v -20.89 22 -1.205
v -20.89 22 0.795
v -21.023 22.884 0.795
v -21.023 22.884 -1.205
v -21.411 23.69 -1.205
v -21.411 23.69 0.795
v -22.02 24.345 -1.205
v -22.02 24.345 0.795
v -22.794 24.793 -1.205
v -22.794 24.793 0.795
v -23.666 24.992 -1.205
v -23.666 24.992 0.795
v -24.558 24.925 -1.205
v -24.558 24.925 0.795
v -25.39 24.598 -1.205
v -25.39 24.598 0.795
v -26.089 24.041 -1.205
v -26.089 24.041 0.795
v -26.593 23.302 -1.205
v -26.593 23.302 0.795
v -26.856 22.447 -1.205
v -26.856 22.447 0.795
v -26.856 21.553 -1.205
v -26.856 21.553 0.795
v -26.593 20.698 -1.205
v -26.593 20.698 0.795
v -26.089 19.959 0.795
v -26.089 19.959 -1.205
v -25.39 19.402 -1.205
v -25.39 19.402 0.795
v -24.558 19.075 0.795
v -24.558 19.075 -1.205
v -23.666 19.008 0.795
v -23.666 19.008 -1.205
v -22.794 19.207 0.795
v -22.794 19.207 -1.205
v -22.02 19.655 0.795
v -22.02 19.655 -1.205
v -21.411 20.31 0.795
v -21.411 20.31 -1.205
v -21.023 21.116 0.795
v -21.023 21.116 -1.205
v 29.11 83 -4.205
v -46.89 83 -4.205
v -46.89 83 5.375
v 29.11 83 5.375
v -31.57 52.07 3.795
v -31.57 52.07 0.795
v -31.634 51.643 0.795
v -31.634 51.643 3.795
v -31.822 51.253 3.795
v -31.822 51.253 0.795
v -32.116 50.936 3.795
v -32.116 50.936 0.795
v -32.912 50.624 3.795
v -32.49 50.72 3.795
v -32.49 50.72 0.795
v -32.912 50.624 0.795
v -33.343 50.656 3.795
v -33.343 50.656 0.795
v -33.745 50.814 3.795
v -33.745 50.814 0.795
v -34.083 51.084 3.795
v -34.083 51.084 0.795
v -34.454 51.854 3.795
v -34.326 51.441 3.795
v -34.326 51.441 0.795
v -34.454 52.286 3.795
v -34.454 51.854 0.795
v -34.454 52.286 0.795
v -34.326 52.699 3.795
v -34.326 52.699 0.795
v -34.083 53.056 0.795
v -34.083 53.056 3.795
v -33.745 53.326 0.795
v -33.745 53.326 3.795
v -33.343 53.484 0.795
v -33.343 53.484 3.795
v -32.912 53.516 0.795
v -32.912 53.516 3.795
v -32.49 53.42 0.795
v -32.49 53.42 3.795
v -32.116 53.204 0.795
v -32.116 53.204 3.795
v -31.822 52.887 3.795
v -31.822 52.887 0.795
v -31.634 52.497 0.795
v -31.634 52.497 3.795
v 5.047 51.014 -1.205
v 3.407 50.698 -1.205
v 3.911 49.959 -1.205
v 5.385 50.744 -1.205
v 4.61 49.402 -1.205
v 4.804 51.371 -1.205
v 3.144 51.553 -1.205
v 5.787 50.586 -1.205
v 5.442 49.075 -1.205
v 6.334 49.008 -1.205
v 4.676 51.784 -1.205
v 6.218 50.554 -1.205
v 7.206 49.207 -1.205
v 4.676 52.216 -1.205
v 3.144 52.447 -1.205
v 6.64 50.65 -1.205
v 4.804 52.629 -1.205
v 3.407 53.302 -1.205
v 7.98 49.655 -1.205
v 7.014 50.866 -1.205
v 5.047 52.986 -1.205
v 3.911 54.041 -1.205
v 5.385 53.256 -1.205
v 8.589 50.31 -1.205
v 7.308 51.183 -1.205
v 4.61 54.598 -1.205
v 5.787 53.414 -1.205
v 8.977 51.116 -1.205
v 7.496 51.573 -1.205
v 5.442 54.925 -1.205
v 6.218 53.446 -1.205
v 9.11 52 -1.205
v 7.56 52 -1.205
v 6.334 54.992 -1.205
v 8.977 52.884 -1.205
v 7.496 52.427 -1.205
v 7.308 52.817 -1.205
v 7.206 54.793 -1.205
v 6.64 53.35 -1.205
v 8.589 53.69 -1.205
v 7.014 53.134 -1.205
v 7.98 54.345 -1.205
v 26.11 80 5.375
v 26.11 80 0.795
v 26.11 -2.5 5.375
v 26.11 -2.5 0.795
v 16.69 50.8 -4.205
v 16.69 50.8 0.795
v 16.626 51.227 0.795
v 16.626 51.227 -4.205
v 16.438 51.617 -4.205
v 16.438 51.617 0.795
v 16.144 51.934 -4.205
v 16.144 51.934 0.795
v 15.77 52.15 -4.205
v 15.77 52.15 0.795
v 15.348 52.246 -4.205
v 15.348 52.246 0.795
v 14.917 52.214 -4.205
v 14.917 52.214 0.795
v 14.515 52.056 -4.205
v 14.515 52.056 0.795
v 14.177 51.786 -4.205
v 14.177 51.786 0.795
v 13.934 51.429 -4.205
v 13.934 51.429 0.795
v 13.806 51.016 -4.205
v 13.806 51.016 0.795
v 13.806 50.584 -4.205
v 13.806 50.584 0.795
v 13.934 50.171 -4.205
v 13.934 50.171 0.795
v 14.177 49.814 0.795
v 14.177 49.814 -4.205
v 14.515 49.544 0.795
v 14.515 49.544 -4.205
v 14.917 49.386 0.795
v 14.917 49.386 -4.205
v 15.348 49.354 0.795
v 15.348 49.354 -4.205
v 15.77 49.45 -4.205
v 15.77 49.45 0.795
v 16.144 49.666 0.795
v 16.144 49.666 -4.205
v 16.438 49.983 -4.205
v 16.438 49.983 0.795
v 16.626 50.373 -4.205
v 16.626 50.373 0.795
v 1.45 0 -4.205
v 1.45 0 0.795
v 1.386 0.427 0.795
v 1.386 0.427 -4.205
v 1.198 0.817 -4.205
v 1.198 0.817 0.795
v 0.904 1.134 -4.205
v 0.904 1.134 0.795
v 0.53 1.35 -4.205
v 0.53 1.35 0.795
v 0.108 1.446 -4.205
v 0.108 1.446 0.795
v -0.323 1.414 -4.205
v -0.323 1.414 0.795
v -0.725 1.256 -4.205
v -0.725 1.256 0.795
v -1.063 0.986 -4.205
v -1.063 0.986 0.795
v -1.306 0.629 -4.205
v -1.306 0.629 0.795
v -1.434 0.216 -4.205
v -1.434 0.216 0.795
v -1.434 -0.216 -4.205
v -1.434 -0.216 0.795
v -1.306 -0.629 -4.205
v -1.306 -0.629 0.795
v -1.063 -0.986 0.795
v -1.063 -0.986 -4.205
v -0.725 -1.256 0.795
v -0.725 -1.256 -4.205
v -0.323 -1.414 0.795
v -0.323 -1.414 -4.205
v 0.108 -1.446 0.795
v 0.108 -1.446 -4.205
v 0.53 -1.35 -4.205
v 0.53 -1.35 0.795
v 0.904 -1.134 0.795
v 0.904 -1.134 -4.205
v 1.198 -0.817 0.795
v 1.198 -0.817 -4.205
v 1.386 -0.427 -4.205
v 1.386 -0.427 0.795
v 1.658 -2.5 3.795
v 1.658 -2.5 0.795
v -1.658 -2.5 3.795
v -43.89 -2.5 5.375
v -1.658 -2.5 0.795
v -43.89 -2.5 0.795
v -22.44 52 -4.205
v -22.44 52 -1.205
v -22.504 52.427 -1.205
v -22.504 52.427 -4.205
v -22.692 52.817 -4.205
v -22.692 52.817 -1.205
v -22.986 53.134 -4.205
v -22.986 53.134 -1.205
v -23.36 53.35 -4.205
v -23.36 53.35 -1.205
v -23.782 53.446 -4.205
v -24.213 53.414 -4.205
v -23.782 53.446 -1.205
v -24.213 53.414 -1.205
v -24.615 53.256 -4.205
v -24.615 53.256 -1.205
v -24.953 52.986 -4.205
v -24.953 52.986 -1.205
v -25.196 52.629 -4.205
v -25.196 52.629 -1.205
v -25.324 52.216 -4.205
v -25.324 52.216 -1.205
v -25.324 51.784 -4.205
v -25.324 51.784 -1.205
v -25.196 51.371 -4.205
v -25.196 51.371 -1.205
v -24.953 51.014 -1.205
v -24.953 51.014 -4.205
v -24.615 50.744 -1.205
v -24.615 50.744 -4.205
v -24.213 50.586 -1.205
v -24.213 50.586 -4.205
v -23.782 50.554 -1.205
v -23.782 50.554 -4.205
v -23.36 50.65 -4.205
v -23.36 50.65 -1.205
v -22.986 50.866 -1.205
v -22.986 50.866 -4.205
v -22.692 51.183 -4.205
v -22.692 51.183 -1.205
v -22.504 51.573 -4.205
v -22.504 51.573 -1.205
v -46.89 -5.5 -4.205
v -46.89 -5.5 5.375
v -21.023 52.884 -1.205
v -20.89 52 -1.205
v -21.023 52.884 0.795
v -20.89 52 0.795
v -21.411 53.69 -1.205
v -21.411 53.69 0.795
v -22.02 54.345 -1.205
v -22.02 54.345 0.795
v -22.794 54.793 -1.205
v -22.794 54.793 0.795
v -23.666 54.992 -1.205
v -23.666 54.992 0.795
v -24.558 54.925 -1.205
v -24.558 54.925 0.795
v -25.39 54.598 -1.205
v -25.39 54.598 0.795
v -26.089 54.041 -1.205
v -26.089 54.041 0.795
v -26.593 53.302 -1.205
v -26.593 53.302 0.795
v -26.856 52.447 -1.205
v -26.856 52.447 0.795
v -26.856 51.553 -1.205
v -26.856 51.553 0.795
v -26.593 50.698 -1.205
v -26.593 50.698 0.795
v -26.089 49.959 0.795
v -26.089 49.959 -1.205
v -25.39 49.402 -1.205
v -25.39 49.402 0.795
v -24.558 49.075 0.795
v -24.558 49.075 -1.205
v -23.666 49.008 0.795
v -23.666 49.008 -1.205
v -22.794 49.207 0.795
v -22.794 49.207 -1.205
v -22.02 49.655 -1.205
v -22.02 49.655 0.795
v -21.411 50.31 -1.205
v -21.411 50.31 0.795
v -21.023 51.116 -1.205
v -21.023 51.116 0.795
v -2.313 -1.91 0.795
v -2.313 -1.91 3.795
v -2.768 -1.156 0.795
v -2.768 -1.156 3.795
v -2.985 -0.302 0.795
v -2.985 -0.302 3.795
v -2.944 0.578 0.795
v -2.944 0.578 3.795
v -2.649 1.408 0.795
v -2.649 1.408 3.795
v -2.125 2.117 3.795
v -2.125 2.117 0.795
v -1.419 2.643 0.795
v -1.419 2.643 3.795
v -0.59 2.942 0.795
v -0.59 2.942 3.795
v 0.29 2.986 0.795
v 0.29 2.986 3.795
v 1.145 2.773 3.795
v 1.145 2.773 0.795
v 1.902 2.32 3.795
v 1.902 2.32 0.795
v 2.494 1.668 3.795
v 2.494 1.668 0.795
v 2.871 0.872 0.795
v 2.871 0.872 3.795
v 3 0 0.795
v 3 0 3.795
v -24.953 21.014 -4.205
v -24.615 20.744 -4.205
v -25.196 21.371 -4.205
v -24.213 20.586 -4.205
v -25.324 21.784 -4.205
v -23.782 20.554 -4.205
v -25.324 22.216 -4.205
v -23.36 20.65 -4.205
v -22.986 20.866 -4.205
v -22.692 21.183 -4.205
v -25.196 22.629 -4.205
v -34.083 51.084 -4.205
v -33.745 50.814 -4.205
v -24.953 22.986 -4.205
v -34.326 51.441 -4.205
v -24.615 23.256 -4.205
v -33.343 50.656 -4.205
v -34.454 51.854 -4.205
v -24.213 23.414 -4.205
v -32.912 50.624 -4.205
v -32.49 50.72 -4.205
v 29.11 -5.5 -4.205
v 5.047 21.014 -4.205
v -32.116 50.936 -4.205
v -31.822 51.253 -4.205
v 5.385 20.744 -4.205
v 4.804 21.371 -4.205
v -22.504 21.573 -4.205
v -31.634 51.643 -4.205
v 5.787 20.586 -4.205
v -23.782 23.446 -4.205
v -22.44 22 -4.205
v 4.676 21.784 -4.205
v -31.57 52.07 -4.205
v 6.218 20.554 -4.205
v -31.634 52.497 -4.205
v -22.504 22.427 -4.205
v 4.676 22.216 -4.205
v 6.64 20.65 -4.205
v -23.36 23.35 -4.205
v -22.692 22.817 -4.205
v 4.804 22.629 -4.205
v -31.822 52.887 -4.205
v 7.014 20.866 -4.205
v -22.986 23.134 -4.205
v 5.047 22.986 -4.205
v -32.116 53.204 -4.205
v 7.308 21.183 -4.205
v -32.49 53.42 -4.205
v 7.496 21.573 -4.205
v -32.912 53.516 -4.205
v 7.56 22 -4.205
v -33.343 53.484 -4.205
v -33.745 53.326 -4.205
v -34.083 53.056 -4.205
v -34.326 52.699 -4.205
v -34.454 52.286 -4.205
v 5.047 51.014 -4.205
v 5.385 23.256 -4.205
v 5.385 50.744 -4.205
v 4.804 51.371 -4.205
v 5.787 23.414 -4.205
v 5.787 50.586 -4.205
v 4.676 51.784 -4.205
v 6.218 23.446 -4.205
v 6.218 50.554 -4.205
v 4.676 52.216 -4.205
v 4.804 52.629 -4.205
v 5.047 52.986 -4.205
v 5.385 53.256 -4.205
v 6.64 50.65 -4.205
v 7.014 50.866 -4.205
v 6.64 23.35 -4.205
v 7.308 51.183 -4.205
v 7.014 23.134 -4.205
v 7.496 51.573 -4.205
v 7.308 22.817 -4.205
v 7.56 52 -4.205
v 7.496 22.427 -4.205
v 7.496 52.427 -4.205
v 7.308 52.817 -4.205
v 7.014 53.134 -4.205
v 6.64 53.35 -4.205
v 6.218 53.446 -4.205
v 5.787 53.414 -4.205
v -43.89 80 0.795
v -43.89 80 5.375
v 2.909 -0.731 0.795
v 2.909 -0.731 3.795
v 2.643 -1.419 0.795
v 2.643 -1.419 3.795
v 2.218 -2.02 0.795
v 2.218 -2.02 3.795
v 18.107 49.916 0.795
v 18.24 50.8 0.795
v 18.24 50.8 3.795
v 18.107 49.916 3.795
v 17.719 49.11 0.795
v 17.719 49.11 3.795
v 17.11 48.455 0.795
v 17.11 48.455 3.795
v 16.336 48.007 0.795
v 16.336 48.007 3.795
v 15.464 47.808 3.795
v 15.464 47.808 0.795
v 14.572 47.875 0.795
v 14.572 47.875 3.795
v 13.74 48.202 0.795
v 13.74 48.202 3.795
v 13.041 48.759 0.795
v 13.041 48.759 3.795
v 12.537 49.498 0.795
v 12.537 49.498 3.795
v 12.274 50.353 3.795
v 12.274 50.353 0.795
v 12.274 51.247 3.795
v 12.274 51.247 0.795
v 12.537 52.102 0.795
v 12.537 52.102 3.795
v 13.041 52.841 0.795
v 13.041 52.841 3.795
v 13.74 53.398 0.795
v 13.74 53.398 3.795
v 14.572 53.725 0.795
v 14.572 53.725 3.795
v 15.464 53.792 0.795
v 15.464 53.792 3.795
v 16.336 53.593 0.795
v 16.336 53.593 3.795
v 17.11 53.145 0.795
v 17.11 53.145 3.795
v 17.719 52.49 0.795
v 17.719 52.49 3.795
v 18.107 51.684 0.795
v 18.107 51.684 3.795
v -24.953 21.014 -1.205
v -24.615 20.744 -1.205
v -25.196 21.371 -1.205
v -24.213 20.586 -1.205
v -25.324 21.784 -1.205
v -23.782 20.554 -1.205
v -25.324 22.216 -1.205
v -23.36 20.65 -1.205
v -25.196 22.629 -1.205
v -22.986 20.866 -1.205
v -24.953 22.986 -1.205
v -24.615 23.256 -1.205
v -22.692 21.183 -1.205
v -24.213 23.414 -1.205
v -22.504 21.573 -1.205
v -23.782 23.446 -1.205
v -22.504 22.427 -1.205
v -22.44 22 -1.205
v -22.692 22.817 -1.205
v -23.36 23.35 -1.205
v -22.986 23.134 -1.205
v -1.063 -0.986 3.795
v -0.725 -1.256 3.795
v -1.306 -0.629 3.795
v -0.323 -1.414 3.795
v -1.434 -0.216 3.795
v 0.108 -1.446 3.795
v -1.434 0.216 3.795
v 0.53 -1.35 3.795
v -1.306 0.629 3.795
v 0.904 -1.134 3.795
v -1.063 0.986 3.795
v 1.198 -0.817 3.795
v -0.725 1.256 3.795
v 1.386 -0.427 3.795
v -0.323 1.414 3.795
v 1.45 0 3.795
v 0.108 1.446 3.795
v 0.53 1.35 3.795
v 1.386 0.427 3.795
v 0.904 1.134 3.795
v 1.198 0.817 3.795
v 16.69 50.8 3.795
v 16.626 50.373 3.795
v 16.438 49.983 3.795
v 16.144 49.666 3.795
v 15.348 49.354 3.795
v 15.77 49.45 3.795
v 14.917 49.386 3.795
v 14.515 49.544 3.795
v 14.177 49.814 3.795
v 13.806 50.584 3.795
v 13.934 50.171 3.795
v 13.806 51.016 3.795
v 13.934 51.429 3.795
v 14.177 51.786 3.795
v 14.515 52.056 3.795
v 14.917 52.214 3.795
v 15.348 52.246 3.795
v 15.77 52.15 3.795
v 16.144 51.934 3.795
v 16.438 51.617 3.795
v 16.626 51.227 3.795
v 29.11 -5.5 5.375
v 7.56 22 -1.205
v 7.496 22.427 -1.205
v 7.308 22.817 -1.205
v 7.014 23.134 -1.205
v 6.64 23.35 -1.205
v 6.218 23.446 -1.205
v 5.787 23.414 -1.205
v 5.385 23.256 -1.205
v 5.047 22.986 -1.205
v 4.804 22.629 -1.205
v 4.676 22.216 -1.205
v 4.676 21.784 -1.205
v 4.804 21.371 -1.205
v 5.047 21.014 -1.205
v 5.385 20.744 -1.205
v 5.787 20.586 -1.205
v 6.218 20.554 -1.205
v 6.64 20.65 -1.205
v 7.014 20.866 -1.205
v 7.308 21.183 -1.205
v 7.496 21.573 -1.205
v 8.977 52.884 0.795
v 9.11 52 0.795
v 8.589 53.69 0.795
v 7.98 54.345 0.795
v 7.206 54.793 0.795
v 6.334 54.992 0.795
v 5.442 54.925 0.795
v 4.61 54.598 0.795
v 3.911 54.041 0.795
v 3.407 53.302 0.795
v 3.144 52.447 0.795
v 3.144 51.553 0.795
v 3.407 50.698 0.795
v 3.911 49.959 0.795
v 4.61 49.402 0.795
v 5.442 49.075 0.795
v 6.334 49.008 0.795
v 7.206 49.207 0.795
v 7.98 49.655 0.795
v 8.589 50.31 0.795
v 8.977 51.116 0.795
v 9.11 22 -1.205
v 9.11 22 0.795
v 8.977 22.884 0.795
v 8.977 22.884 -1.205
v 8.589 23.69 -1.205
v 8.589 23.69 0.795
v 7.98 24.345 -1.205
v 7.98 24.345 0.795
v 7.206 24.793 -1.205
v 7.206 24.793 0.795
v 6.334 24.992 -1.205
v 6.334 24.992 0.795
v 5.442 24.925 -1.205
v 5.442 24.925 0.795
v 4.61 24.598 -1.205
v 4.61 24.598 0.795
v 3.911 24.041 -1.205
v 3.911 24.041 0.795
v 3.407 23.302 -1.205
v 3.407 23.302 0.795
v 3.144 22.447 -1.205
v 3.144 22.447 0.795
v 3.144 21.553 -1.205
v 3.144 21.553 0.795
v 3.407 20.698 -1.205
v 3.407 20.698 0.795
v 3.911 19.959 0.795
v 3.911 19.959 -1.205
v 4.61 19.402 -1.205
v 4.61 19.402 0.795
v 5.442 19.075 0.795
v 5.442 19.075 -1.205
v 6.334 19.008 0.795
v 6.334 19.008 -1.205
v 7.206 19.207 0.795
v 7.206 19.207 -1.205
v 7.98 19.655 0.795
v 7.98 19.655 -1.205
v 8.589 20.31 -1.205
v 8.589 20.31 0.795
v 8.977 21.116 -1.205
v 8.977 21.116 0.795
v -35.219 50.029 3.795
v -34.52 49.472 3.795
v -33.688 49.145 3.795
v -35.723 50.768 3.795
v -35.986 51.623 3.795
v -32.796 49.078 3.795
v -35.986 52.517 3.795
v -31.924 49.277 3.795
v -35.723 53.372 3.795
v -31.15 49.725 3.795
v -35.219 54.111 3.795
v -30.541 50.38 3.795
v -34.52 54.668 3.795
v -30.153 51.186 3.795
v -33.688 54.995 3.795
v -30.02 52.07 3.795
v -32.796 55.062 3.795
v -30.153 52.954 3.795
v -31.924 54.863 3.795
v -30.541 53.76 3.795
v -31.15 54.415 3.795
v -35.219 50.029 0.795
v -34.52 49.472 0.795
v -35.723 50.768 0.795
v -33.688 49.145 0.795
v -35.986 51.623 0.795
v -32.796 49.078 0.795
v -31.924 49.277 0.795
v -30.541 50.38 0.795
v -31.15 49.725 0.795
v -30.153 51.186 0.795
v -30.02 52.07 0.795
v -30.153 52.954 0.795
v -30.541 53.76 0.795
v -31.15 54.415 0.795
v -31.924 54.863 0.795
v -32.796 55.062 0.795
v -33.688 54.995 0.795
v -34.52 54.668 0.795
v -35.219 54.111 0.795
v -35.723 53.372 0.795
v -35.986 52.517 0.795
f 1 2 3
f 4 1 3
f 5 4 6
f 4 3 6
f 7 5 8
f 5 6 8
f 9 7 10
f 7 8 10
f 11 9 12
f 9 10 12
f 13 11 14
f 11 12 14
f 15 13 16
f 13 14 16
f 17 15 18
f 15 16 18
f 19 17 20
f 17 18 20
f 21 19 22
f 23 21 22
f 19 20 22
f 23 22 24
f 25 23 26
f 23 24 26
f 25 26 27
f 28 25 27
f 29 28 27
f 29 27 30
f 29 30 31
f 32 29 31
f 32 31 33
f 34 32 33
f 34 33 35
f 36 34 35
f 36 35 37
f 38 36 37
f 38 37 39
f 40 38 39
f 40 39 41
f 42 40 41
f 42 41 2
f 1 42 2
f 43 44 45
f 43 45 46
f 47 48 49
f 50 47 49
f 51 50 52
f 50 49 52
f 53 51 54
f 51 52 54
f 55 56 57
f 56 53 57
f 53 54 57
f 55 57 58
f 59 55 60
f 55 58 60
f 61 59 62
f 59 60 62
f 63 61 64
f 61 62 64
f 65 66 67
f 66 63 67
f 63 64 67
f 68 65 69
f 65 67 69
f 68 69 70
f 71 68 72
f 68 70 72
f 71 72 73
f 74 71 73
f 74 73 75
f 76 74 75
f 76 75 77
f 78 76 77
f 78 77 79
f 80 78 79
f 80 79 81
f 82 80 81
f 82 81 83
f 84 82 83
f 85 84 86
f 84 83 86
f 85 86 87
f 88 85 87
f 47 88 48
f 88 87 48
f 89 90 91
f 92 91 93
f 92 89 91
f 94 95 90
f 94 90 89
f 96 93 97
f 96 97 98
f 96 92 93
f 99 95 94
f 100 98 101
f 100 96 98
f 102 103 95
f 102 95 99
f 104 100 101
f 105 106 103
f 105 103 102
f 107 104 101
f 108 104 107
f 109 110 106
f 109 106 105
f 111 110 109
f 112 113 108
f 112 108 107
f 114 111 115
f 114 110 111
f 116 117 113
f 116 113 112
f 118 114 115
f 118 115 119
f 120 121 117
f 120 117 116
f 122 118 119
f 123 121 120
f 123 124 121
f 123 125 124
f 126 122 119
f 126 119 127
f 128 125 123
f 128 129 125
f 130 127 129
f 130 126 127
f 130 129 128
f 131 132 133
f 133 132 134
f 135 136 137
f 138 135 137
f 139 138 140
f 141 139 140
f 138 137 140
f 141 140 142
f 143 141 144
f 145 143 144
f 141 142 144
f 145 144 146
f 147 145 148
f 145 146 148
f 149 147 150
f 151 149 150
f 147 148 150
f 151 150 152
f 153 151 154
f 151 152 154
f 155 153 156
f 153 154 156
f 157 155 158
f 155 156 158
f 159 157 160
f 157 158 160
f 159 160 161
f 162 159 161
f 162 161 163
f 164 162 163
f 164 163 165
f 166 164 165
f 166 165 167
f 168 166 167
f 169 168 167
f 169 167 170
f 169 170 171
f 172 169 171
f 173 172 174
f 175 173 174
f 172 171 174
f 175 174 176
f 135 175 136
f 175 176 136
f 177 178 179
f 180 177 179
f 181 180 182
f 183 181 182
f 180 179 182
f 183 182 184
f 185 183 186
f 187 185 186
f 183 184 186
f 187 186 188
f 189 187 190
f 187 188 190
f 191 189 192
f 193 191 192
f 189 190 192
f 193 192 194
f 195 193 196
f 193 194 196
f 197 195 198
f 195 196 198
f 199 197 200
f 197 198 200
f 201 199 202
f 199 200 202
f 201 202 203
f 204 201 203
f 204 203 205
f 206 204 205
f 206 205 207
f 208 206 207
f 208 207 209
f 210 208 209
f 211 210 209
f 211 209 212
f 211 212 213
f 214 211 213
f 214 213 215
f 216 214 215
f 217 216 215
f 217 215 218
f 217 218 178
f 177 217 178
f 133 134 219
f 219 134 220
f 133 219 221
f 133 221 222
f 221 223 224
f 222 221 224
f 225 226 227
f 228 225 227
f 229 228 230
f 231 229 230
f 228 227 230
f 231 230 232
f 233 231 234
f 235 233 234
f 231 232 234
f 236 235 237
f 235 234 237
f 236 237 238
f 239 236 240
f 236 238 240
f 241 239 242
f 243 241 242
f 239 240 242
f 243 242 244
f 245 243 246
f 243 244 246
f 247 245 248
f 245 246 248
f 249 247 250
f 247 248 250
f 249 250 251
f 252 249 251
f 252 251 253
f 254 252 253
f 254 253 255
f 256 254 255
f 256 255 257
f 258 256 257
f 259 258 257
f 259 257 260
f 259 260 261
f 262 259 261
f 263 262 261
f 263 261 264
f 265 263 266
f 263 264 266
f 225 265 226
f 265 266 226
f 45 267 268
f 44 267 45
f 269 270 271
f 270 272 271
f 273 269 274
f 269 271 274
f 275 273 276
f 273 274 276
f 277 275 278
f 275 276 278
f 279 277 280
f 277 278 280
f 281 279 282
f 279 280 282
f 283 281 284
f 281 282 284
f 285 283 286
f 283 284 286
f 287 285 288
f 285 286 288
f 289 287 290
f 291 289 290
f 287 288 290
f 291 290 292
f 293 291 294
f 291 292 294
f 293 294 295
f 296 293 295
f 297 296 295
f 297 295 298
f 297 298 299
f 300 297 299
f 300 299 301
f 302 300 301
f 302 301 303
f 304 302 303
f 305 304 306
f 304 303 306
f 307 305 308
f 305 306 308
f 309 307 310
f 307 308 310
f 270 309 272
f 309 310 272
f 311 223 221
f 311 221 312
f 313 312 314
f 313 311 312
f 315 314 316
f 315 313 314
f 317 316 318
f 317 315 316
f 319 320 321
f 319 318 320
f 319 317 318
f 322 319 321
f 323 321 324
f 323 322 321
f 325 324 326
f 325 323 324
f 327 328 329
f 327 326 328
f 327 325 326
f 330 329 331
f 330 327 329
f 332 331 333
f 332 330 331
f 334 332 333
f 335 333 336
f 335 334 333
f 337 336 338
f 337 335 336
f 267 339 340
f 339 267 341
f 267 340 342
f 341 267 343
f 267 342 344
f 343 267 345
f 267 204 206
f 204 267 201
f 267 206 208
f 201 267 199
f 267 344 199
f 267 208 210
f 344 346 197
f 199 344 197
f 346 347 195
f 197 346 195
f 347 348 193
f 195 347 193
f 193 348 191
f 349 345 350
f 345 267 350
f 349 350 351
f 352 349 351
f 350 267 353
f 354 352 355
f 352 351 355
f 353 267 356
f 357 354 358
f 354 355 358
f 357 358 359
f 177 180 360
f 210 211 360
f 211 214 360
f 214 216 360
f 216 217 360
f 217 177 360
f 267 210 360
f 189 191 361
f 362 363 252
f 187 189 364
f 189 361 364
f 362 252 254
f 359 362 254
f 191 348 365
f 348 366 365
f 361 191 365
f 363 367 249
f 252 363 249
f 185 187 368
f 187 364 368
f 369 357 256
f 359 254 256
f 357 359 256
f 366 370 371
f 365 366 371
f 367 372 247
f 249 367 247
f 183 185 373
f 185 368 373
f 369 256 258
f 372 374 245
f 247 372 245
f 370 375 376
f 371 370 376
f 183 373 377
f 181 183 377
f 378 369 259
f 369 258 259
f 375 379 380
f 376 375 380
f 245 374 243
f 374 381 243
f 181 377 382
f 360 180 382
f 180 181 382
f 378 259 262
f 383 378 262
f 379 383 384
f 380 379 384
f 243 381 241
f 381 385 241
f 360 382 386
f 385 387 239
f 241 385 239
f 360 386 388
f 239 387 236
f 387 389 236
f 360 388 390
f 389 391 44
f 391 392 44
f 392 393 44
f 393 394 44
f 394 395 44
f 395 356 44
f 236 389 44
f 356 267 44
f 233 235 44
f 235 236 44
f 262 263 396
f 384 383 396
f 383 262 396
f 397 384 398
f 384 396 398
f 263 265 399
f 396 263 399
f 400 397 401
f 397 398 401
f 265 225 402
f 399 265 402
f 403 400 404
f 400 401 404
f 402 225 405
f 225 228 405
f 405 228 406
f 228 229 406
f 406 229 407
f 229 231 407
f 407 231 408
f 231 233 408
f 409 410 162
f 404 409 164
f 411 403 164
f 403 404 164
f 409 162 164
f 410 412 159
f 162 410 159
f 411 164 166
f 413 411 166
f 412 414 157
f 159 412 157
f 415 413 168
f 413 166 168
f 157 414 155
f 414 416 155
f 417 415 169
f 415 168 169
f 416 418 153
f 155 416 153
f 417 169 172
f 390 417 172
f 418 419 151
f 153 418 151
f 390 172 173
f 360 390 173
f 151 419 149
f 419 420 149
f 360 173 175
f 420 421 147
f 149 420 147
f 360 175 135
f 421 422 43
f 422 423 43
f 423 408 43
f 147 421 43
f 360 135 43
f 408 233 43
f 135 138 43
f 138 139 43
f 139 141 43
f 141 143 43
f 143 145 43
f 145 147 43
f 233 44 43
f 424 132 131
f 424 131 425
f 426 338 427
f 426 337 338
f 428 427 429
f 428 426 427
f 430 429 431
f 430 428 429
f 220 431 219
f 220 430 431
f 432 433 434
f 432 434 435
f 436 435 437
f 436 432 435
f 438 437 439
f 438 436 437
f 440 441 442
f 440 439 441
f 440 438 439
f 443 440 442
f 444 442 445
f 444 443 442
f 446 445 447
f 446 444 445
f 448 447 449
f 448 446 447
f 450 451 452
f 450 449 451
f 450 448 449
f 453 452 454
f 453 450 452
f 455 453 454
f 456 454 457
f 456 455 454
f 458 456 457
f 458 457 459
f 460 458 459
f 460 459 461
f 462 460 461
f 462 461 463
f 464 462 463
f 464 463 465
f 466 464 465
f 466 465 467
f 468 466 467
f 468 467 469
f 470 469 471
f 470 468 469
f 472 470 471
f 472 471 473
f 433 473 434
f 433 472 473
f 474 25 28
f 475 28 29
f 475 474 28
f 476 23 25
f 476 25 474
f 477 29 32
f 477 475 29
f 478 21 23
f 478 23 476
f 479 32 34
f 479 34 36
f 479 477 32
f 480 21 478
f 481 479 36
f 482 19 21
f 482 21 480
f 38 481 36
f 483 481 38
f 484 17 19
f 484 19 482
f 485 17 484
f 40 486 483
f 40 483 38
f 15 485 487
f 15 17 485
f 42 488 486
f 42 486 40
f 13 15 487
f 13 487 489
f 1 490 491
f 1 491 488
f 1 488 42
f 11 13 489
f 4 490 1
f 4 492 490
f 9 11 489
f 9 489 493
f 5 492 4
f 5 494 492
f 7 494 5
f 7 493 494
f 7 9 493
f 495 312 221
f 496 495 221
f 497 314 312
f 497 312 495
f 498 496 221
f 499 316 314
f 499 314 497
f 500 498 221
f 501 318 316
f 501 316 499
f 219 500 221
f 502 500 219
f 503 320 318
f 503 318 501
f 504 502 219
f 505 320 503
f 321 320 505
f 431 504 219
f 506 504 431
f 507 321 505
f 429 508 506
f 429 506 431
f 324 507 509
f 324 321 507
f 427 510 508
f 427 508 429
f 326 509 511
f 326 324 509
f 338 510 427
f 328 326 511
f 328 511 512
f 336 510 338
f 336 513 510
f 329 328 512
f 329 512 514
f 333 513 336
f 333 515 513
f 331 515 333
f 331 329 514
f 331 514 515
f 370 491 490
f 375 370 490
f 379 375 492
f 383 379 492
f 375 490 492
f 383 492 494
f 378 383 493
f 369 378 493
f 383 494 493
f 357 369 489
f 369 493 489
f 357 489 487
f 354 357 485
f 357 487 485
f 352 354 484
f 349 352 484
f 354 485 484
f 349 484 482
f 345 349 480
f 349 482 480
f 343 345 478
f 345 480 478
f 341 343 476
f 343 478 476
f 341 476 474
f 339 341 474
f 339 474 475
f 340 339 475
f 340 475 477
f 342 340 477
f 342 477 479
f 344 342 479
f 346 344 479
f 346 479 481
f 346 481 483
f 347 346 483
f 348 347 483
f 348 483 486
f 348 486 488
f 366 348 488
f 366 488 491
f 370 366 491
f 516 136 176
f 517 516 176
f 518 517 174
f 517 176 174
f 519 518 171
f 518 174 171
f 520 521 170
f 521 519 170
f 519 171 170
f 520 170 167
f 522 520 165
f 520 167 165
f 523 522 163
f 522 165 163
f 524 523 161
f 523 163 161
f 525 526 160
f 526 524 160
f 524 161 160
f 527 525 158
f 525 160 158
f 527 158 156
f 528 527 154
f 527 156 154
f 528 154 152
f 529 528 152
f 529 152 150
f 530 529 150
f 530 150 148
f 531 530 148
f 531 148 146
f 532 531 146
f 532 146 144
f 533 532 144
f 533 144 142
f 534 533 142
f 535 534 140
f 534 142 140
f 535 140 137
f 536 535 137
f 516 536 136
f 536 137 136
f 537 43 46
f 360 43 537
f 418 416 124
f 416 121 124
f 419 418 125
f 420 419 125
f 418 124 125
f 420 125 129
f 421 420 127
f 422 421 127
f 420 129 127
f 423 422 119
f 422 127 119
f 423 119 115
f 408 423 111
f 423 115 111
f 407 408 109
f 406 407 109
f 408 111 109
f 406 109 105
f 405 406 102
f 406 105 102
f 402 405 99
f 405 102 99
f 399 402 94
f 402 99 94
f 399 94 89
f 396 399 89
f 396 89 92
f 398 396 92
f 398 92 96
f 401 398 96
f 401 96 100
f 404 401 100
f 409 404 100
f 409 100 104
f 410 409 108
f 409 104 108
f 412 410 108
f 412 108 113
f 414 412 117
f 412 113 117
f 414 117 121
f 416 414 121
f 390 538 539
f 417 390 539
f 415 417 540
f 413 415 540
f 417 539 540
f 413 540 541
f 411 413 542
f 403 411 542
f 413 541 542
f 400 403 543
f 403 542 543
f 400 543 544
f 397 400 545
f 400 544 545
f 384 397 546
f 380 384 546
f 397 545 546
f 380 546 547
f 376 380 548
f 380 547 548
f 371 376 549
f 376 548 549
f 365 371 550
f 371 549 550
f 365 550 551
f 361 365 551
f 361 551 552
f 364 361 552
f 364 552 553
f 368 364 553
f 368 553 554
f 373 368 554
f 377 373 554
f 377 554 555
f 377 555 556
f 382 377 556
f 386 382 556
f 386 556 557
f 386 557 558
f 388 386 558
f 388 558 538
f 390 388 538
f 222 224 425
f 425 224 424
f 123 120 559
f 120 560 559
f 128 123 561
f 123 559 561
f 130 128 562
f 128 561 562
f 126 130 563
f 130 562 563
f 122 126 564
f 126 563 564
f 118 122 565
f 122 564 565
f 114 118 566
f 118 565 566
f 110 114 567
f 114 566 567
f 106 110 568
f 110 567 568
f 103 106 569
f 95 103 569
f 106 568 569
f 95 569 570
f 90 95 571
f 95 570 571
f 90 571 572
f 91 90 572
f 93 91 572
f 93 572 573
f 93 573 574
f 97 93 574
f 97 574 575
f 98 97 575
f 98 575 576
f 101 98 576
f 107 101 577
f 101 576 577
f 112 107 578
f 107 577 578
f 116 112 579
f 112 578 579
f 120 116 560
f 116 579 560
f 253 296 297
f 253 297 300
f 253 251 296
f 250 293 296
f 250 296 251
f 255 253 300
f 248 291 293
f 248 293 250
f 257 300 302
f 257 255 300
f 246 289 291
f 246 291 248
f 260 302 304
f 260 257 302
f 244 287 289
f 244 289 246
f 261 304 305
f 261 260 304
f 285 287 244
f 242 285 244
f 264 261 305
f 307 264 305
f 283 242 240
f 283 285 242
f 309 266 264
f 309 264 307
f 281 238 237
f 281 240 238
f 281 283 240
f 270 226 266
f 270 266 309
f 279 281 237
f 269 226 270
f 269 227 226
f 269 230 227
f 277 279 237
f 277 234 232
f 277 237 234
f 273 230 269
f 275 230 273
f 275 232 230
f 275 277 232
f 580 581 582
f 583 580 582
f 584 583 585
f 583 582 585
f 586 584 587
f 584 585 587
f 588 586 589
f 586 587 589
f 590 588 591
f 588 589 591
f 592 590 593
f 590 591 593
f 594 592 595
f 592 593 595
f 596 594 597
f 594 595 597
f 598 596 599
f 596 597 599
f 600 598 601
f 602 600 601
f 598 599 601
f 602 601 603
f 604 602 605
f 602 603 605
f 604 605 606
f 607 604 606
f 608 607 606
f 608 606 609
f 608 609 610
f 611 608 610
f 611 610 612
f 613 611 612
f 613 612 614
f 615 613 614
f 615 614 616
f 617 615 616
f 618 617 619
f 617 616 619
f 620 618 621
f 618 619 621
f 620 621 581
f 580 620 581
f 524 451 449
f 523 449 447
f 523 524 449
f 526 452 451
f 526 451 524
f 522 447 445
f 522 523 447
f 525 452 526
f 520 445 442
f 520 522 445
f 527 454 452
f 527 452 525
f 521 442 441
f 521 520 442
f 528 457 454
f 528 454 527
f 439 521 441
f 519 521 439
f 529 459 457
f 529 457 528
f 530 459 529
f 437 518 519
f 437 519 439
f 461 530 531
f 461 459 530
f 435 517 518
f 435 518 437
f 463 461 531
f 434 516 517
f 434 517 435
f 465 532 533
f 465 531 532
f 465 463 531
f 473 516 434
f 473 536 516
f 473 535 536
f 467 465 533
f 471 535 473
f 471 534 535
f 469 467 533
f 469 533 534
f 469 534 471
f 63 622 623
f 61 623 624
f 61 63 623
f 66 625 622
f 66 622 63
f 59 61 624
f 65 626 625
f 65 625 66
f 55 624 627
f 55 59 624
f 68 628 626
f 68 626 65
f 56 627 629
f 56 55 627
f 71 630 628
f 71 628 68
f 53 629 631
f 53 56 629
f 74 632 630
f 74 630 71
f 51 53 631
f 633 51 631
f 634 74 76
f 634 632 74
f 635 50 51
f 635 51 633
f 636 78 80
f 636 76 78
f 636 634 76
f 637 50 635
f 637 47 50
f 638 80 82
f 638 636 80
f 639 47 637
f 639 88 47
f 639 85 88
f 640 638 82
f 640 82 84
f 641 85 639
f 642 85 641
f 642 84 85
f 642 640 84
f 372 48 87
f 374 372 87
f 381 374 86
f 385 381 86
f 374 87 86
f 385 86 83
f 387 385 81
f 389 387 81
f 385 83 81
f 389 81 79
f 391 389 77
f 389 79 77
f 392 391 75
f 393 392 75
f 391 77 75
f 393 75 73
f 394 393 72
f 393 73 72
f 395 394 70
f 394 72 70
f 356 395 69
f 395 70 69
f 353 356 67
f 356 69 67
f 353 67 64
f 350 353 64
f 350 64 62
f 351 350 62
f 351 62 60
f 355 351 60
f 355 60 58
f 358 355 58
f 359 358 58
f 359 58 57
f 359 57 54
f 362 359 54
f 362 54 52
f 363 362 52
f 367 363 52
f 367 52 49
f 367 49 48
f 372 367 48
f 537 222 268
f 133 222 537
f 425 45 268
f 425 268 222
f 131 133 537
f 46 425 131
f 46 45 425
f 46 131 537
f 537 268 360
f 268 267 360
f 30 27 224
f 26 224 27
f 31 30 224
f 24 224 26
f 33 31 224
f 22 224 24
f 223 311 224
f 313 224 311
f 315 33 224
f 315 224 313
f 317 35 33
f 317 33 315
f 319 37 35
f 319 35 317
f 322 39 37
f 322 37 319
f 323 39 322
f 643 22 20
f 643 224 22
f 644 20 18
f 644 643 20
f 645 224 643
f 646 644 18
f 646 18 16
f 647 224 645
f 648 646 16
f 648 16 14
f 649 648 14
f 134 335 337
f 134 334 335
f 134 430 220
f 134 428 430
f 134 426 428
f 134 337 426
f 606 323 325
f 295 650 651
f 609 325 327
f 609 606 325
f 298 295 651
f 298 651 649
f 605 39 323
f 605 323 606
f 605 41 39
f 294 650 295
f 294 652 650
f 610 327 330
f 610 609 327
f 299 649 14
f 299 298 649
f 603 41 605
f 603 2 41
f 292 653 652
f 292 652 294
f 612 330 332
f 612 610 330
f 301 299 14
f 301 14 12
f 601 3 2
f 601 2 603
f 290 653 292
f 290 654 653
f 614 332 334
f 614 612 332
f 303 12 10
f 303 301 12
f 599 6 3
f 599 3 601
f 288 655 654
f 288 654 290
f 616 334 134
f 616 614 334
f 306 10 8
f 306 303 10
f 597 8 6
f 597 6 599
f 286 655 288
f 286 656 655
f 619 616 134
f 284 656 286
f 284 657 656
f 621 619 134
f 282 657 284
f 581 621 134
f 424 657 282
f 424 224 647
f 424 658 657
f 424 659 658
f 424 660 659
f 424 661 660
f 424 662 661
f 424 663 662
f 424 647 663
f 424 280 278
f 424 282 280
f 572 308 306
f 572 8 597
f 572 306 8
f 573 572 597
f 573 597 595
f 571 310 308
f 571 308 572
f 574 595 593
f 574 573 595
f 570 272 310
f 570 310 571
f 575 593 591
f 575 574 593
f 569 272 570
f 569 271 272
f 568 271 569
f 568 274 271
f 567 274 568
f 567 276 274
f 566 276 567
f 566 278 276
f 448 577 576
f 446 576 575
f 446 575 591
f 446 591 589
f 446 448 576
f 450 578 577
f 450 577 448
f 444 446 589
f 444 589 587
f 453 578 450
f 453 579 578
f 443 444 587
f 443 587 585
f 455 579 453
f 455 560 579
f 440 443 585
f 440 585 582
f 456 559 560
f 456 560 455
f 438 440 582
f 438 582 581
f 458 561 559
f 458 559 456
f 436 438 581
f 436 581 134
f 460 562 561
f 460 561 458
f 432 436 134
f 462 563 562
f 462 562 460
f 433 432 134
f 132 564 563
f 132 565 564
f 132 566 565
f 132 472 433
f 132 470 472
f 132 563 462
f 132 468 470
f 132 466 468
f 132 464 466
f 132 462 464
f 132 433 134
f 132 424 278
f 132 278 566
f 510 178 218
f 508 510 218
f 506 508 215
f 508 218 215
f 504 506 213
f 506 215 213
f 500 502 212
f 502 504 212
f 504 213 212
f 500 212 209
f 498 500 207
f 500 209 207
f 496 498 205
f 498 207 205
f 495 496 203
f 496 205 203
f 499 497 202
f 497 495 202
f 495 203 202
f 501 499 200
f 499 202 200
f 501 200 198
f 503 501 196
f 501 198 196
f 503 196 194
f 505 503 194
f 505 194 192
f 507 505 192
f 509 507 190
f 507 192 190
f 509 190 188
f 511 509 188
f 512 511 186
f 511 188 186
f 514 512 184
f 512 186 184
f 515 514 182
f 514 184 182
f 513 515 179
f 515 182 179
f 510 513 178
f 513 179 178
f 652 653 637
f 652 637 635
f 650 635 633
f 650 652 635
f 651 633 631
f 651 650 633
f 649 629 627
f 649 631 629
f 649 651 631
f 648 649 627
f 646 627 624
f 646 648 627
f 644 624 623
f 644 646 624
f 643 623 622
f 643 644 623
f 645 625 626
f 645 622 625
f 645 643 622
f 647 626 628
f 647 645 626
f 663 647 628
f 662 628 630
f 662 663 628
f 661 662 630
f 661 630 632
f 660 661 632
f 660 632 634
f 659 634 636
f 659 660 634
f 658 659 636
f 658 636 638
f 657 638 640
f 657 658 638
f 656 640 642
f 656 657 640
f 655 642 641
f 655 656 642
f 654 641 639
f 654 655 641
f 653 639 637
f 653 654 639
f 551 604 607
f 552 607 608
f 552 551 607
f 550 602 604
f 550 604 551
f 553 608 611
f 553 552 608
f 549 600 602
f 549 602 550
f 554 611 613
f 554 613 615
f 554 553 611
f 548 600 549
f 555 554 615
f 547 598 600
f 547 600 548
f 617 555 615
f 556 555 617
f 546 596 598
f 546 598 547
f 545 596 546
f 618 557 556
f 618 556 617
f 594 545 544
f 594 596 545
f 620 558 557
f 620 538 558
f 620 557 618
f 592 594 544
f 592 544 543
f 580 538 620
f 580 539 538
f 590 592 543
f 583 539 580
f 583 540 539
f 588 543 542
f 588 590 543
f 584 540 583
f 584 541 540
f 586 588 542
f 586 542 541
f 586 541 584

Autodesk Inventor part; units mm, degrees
ref_plane "YZ Plane" through (0, 0, 0) normal (1, 0, 0) x (0, 1, 0)
ref_plane "XZ Plane" through (0, 0, 0) normal (0, 1, 0) x (-1, 0, 0)
ref_plane "XY Plane" through (0, 0, 0) normal (0, 0, 1) x (1, 0, 0)
ref_plane "Work Plane1" through (-41.89, 79.898, 0.7952) normal (0, 0, 1) x (1, 0, 0)
sketch "Sketch1" plane through (-41.89, 79.898, 0.7952) normal (0, 0, 1) x (1, 0, 0)
  circle A0 centre (41.89, -79.898) radius 1.45
  circle A1 centre (8.87, -27.828) radius 1.45
  circle A2 centre (57.13, -29.098) radius 1.45
  arc A3 (66, -80.398) -> (68, -78.398) centre (66, -78.398) ccw projected
  line L0 (66, 0.102) -> (0, 0.102) projected
  line L1 (-2, -1.898) -> (-2, -24.398) projected
  line L2 (-2, 0.102) -> (68, 0.102)
  line L3 (68, 0.102) -> (68, -82.398)
  line L4 (68, -82.398) -> (-2, -82.398)
  line L5 (-2, -82.398) -> (-2, 0.102)
  line L6 (-2, 3.102) -> (-5, 3.102)
  line L7 (68, -85.398) -> (71, -85.398)
  line L8 (-5, 3.102) -> (71, 3.102)
  line L9 (71, 3.102) -> (71, -85.398)
  line L10 (71, -85.398) -> (-5, -85.398)
  line L11 (-5, -85.398) -> (-5, 3.102)
  point P0 (44.5, -82.398)
  point P1 (-2, 3.102)
  point P2 (-2, -24.398)
  point P3 (-2, -1.898)
  point P4 (66, 0.102)
  dimension "d0" = 2.9
  dimension "d1" = 2.9
  dimension "d2" = 2.9
extrude "Extrusion1" add sketch "Sketch1" against normal blind 5 contours L2 L3 L4 L5 L1 L0 | L8 L9 L7 L10 L11 L6
sketch "Sketch2" plane through (-41.89, 79.898, 0.7952) normal (0, 0, 1) x (1, 0, 0)
  circle A0 centre (8.87, -27.828) radius 1.45 projected
  circle A1 centre (8.87, -27.828) radius 3
  circle A2 centre (57.13, -29.098) radius 1.45 projected
  circle A3 centre (57.13, -29.098) radius 3
  circle A4 centre (41.89, -79.898) radius 3
  circle A5 centre (41.89, -79.898) radius 1.45
  dimension "d9" = 6
  dimension "d10" = 6
  dimension "d11" = 6
extrude "Extrusion2" add sketch "Sketch2" along normal blind 3
sketch "Sketch3" plane through (-41.89, 79.898, 0.7952) normal (0, 0, 1) x (1, 0, 0)
  line L0 (71, -85.398) -> (-5, -85.398) projected
  circle A0 centre (18, -27.898) radius 1.45
  circle A1 centre (48, -27.898) radius 1.45
  circle A2 centre (18, -57.898) radius 1.45
  circle A3 centre (48, -57.898) radius 1.45
  point P0 (41.89, -79.898)
  dimension "d19" = 2.9
  dimension "d20" = 2.9
  dimension "d21" = 2.9
  dimension "d22" = 2.9
extrude "Extrusion3" cut sketch "Sketch3" against normal up to surface (5 mm away)
sketch "Sketch4" plane through (-41.89, 79.898, 0.7952) normal (0, 0, 1) x (1, 0, 0)
  circle A0 centre (18, -57.898) radius 1.45 projected
  circle A1 centre (18, -57.898) radius 3
  circle A2 centre (18, -57.898) radius 1.45
  circle A3 centre (48, -57.898) radius 1.45 projected
  circle A4 centre (48, -57.898) radius 1.45
  circle A5 centre (48, -57.898) radius 3
  circle A6 centre (48, -27.898) radius 1.45 projected
  circle A7 centre (48, -27.898) radius 1.45
  circle A8 centre (48, -27.898) radius 3
  circle A9 centre (18, -27.898) radius 1.45 projected
  circle A10 centre (18, -27.898) radius 1.45
  circle A11 centre (18, -27.898) radius 3
  point P0 (41.89, -79.898)
  dimension "d25" = 6
  dimension "d26" = 6
  dimension "d27" = 6
  dimension "d28" = 6
extrude "Extrusion4" cut sketch "Sketch4" against normal blind 2
extrude "Extrusion5" add sketch "Sketch1" along normal blind 4.58 contours L8 L9 L7 L10 L11 L6
properties part number "nucleo_din_connector"
